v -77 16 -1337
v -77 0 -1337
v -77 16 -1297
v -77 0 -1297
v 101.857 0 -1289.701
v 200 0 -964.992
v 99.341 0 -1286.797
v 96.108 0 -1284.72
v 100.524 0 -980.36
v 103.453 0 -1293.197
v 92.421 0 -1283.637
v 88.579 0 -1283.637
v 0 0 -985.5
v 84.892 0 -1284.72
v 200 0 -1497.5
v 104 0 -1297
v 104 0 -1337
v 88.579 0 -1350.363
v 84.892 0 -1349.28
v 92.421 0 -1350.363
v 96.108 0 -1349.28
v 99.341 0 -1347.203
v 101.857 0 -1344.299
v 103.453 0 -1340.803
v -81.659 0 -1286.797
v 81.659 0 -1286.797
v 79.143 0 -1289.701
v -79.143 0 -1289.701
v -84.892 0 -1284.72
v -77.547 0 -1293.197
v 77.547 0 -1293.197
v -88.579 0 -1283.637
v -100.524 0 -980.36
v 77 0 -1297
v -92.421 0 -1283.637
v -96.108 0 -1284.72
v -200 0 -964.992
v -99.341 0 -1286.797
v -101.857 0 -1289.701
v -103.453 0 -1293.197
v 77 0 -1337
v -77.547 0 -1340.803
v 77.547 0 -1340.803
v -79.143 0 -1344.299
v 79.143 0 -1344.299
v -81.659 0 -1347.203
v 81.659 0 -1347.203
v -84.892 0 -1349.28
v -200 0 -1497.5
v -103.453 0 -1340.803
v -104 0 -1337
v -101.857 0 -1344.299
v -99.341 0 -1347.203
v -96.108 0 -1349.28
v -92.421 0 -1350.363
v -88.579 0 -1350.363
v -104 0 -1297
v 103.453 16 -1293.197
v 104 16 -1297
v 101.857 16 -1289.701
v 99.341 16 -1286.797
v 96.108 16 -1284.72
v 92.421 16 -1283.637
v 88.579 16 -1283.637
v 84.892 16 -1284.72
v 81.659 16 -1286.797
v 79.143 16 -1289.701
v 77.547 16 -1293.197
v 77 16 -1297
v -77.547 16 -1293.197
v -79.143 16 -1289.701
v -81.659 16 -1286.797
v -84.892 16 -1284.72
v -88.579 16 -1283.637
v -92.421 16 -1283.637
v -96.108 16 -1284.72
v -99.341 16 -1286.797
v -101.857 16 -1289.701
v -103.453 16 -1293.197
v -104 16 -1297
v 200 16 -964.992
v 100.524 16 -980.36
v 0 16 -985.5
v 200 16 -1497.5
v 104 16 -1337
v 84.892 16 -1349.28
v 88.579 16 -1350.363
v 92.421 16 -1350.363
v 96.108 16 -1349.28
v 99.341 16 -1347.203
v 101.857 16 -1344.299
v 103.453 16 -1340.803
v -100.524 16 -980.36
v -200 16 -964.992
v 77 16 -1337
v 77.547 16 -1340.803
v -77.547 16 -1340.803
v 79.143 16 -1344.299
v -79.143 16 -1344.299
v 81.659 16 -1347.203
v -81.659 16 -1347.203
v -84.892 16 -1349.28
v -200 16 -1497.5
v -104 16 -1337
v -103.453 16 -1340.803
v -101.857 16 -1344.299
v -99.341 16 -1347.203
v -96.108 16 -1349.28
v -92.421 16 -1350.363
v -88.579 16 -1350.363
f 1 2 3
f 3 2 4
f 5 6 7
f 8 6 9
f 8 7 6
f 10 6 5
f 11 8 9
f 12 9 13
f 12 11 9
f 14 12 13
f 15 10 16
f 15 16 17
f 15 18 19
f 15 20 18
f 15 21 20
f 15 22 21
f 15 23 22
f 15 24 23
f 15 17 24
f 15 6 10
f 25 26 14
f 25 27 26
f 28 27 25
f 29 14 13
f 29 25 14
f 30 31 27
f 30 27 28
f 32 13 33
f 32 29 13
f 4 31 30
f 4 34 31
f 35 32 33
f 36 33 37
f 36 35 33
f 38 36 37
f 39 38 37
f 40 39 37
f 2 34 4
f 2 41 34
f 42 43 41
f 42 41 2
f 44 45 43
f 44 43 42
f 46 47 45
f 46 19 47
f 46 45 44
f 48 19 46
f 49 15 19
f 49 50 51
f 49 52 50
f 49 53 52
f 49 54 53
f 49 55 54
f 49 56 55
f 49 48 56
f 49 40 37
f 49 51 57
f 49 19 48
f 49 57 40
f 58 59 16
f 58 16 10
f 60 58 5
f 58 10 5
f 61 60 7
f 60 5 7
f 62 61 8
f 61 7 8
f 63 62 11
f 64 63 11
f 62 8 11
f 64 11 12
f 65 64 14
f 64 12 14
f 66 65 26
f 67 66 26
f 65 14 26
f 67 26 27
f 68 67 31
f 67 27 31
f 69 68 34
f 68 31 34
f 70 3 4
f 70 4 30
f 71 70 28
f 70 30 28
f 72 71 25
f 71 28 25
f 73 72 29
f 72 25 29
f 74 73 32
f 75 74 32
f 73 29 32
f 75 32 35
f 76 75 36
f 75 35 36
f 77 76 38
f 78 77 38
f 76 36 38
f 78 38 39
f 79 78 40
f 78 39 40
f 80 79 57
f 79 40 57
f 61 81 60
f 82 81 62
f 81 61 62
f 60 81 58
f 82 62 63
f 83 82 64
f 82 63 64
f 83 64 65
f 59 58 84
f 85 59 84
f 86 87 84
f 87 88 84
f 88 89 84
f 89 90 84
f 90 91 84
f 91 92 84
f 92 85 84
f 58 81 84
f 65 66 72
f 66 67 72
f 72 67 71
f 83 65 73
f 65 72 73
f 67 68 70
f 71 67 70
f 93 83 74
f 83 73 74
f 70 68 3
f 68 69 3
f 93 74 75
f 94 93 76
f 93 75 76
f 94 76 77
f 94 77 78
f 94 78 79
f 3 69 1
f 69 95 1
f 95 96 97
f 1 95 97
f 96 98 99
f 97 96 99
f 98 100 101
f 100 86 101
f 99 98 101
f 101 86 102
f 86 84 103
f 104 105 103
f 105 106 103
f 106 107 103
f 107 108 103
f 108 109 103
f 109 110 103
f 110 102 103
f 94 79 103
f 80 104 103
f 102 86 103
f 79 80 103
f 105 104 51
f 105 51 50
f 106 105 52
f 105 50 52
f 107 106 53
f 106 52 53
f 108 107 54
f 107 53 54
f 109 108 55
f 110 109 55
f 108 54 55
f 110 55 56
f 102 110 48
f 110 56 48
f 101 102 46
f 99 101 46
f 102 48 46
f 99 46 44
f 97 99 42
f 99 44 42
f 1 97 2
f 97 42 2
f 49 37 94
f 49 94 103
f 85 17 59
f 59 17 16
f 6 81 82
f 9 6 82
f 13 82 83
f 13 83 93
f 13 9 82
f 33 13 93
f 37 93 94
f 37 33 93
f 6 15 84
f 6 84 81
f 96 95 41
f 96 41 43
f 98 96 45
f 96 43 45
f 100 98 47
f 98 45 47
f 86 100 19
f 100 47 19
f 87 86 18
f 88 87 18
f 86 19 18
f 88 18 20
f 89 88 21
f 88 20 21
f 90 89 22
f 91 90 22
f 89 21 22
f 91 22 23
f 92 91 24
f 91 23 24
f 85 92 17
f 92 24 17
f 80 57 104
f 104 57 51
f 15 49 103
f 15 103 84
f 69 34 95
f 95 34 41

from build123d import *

# Parameters (mm, degrees)
SM_BASE_FLANGE_1_DEPTH = 16


# Sheet-metal steps are written as plain solids
with BuildPart() as part:
    # Sketch 1 → 基体-法兰1 (new body)
    with BuildSketch(Plane(origin=(0, 0, 0), x_dir=(1, 0, 0), z_dir=(0, 1, 0))):
        with BuildLine():
            Line((-200, 964.992357483), (-200, 1497.5))
            Line((-200, 1497.5), (200, 1497.5))
            Line((200, 1497.5), (200, 964.992357483))
            ThreePointArc((200, 964.992357483), (0, 985.5), (-200, 964.992357483))
        make_face()
        with BuildLine():
            Line((-77, 1337), (-77, 1297))
            ThreePointArc((-77, 1297), (-90.5, 1283.5), (-104, 1297))
            Line((-104, 1297), (-104, 1337))
            ThreePointArc((-104, 1337), (-90.5, 1350.5), (-77, 1337))
        make_face(mode=Mode.SUBTRACT)
        with BuildLine():
            Line((77, 1297), (77, 1337))
            ThreePointArc((77, 1337), (90.5, 1350.5), (104, 1337))
            Line((104, 1337), (104, 1297))
            ThreePointArc((104, 1297), (90.5, 1283.5), (77, 1297))
        make_face(mode=Mode.SUBTRACT)
    extrude(amount=SM_BASE_FLANGE_1_DEPTH)


solid = part.part
